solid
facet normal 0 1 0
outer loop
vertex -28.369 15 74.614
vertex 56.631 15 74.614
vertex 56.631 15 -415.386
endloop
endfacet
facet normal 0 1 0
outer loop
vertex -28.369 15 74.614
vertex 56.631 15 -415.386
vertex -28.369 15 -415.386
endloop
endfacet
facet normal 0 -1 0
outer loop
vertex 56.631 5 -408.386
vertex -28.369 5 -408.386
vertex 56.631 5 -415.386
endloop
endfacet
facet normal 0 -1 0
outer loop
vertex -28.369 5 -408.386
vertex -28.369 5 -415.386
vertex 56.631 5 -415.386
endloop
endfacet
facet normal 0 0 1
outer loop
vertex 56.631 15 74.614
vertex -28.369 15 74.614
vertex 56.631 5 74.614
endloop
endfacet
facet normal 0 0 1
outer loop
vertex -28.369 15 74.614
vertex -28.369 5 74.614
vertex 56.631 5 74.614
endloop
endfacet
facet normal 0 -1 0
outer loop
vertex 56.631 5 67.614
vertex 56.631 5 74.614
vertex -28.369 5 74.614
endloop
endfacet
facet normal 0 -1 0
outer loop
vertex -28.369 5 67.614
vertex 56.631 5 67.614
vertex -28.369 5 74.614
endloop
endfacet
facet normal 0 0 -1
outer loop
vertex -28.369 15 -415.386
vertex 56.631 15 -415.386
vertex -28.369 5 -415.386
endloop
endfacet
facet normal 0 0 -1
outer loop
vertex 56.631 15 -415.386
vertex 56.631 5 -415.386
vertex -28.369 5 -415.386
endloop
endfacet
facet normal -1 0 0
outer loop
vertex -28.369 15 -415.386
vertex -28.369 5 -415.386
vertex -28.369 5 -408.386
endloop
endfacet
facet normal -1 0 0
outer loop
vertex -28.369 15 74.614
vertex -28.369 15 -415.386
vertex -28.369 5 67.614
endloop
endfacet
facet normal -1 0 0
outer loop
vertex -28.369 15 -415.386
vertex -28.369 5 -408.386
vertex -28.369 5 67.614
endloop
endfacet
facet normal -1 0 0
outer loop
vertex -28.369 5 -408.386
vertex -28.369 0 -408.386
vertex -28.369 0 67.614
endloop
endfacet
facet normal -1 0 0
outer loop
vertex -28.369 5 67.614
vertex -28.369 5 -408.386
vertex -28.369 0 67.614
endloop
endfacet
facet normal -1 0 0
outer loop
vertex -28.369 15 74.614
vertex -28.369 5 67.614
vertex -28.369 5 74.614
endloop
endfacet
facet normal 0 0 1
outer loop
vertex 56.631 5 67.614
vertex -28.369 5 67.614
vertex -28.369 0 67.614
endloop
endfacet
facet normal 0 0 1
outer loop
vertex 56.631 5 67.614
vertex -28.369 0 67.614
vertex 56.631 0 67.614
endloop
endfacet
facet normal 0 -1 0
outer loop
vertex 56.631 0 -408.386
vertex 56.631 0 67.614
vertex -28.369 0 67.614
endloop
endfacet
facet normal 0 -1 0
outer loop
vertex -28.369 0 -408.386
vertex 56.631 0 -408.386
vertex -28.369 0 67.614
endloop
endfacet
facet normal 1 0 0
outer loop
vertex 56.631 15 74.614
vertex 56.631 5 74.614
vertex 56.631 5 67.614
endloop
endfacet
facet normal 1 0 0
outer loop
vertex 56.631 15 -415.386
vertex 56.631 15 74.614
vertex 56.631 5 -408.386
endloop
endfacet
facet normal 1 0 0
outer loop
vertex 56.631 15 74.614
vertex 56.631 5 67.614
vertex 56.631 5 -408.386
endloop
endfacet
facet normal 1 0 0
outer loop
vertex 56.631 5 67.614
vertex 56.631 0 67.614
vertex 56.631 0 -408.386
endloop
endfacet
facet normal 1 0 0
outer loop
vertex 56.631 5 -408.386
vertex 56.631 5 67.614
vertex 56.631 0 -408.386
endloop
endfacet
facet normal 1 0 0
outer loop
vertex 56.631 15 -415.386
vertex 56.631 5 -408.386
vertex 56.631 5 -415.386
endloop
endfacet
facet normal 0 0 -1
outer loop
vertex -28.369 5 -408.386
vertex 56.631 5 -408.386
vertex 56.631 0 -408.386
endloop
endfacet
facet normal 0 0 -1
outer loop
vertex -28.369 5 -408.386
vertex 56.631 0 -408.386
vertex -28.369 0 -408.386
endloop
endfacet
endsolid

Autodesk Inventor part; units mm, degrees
ref_plane "YZ Plane" through (0, 0, 0) normal (1, 0, 0) x (0, 1, 0)
ref_plane "XZ Plane" through (0, 0, 0) normal (0, 1, 0) x (-1, 0, 0)
ref_plane "XY Plane" through (0, 0, 0) normal (0, 0, 1) x (1, 0, 0)
sketch "Sketch1" plane through (0, 0, 0) normal (0, 1, 0) x (-1, 0, 0)
  line L0 (28.3692, 74.6141) -> (-56.6308, 74.6141)
  line L1 (-56.6308, 74.6141) -> (-56.6308, -415.3859)
  line L2 (-56.6308, -415.3859) -> (28.3692, -415.3859)
  line L3 (28.3692, -415.3859) -> (28.3692, 74.6141)
  point P0 (0, 0)
  dimension "d0" = 85
  dimension "d1" = 490
extrude "Extrusion1" add sketch "Sketch1" along normal blind 15
sketch "Sketch2" plane through (-28.3692, 0, 74.6141) normal (0, 0, 1) x (1, 0, 0)
  line L0 (85, 0) -> (0, 0) projected
  line L1 (0, 0) -> (85, 0)
  line L2 (85, 0) -> (85, 5)
  line L3 (85, 5) -> (0, 5)
  line L4 (0, 5) -> (0, 0)
  point P0 (28.3692, 0)
  dimension "d4" = 85
  dimension "d5" = 5
extrude "Extrusion2" cut sketch "Sketch2" against normal blind 7
sketch "Sketch3" plane through (56.6308, 0, -415.3859) normal (0, 0, -1) x (-1, 0, 0)
  line L0 (85, 0) -> (85, 15) projected
  line L1 (85, 5) -> (0, 5) projected
  line L2 (85, 0) -> (0, 0)
  line L3 (0, 0) -> (0, 5)
  line L4 (0, 5) -> (85, 5)
  line L5 (85, 5) -> (85, 0)
  point P0 (56.6308, 0)
  dimension "d8" = 85
  dimension "d9" = 5
extrude "Extrusion3" cut sketch "Sketch3" against normal blind 7
properties part number "Arcade_top"
